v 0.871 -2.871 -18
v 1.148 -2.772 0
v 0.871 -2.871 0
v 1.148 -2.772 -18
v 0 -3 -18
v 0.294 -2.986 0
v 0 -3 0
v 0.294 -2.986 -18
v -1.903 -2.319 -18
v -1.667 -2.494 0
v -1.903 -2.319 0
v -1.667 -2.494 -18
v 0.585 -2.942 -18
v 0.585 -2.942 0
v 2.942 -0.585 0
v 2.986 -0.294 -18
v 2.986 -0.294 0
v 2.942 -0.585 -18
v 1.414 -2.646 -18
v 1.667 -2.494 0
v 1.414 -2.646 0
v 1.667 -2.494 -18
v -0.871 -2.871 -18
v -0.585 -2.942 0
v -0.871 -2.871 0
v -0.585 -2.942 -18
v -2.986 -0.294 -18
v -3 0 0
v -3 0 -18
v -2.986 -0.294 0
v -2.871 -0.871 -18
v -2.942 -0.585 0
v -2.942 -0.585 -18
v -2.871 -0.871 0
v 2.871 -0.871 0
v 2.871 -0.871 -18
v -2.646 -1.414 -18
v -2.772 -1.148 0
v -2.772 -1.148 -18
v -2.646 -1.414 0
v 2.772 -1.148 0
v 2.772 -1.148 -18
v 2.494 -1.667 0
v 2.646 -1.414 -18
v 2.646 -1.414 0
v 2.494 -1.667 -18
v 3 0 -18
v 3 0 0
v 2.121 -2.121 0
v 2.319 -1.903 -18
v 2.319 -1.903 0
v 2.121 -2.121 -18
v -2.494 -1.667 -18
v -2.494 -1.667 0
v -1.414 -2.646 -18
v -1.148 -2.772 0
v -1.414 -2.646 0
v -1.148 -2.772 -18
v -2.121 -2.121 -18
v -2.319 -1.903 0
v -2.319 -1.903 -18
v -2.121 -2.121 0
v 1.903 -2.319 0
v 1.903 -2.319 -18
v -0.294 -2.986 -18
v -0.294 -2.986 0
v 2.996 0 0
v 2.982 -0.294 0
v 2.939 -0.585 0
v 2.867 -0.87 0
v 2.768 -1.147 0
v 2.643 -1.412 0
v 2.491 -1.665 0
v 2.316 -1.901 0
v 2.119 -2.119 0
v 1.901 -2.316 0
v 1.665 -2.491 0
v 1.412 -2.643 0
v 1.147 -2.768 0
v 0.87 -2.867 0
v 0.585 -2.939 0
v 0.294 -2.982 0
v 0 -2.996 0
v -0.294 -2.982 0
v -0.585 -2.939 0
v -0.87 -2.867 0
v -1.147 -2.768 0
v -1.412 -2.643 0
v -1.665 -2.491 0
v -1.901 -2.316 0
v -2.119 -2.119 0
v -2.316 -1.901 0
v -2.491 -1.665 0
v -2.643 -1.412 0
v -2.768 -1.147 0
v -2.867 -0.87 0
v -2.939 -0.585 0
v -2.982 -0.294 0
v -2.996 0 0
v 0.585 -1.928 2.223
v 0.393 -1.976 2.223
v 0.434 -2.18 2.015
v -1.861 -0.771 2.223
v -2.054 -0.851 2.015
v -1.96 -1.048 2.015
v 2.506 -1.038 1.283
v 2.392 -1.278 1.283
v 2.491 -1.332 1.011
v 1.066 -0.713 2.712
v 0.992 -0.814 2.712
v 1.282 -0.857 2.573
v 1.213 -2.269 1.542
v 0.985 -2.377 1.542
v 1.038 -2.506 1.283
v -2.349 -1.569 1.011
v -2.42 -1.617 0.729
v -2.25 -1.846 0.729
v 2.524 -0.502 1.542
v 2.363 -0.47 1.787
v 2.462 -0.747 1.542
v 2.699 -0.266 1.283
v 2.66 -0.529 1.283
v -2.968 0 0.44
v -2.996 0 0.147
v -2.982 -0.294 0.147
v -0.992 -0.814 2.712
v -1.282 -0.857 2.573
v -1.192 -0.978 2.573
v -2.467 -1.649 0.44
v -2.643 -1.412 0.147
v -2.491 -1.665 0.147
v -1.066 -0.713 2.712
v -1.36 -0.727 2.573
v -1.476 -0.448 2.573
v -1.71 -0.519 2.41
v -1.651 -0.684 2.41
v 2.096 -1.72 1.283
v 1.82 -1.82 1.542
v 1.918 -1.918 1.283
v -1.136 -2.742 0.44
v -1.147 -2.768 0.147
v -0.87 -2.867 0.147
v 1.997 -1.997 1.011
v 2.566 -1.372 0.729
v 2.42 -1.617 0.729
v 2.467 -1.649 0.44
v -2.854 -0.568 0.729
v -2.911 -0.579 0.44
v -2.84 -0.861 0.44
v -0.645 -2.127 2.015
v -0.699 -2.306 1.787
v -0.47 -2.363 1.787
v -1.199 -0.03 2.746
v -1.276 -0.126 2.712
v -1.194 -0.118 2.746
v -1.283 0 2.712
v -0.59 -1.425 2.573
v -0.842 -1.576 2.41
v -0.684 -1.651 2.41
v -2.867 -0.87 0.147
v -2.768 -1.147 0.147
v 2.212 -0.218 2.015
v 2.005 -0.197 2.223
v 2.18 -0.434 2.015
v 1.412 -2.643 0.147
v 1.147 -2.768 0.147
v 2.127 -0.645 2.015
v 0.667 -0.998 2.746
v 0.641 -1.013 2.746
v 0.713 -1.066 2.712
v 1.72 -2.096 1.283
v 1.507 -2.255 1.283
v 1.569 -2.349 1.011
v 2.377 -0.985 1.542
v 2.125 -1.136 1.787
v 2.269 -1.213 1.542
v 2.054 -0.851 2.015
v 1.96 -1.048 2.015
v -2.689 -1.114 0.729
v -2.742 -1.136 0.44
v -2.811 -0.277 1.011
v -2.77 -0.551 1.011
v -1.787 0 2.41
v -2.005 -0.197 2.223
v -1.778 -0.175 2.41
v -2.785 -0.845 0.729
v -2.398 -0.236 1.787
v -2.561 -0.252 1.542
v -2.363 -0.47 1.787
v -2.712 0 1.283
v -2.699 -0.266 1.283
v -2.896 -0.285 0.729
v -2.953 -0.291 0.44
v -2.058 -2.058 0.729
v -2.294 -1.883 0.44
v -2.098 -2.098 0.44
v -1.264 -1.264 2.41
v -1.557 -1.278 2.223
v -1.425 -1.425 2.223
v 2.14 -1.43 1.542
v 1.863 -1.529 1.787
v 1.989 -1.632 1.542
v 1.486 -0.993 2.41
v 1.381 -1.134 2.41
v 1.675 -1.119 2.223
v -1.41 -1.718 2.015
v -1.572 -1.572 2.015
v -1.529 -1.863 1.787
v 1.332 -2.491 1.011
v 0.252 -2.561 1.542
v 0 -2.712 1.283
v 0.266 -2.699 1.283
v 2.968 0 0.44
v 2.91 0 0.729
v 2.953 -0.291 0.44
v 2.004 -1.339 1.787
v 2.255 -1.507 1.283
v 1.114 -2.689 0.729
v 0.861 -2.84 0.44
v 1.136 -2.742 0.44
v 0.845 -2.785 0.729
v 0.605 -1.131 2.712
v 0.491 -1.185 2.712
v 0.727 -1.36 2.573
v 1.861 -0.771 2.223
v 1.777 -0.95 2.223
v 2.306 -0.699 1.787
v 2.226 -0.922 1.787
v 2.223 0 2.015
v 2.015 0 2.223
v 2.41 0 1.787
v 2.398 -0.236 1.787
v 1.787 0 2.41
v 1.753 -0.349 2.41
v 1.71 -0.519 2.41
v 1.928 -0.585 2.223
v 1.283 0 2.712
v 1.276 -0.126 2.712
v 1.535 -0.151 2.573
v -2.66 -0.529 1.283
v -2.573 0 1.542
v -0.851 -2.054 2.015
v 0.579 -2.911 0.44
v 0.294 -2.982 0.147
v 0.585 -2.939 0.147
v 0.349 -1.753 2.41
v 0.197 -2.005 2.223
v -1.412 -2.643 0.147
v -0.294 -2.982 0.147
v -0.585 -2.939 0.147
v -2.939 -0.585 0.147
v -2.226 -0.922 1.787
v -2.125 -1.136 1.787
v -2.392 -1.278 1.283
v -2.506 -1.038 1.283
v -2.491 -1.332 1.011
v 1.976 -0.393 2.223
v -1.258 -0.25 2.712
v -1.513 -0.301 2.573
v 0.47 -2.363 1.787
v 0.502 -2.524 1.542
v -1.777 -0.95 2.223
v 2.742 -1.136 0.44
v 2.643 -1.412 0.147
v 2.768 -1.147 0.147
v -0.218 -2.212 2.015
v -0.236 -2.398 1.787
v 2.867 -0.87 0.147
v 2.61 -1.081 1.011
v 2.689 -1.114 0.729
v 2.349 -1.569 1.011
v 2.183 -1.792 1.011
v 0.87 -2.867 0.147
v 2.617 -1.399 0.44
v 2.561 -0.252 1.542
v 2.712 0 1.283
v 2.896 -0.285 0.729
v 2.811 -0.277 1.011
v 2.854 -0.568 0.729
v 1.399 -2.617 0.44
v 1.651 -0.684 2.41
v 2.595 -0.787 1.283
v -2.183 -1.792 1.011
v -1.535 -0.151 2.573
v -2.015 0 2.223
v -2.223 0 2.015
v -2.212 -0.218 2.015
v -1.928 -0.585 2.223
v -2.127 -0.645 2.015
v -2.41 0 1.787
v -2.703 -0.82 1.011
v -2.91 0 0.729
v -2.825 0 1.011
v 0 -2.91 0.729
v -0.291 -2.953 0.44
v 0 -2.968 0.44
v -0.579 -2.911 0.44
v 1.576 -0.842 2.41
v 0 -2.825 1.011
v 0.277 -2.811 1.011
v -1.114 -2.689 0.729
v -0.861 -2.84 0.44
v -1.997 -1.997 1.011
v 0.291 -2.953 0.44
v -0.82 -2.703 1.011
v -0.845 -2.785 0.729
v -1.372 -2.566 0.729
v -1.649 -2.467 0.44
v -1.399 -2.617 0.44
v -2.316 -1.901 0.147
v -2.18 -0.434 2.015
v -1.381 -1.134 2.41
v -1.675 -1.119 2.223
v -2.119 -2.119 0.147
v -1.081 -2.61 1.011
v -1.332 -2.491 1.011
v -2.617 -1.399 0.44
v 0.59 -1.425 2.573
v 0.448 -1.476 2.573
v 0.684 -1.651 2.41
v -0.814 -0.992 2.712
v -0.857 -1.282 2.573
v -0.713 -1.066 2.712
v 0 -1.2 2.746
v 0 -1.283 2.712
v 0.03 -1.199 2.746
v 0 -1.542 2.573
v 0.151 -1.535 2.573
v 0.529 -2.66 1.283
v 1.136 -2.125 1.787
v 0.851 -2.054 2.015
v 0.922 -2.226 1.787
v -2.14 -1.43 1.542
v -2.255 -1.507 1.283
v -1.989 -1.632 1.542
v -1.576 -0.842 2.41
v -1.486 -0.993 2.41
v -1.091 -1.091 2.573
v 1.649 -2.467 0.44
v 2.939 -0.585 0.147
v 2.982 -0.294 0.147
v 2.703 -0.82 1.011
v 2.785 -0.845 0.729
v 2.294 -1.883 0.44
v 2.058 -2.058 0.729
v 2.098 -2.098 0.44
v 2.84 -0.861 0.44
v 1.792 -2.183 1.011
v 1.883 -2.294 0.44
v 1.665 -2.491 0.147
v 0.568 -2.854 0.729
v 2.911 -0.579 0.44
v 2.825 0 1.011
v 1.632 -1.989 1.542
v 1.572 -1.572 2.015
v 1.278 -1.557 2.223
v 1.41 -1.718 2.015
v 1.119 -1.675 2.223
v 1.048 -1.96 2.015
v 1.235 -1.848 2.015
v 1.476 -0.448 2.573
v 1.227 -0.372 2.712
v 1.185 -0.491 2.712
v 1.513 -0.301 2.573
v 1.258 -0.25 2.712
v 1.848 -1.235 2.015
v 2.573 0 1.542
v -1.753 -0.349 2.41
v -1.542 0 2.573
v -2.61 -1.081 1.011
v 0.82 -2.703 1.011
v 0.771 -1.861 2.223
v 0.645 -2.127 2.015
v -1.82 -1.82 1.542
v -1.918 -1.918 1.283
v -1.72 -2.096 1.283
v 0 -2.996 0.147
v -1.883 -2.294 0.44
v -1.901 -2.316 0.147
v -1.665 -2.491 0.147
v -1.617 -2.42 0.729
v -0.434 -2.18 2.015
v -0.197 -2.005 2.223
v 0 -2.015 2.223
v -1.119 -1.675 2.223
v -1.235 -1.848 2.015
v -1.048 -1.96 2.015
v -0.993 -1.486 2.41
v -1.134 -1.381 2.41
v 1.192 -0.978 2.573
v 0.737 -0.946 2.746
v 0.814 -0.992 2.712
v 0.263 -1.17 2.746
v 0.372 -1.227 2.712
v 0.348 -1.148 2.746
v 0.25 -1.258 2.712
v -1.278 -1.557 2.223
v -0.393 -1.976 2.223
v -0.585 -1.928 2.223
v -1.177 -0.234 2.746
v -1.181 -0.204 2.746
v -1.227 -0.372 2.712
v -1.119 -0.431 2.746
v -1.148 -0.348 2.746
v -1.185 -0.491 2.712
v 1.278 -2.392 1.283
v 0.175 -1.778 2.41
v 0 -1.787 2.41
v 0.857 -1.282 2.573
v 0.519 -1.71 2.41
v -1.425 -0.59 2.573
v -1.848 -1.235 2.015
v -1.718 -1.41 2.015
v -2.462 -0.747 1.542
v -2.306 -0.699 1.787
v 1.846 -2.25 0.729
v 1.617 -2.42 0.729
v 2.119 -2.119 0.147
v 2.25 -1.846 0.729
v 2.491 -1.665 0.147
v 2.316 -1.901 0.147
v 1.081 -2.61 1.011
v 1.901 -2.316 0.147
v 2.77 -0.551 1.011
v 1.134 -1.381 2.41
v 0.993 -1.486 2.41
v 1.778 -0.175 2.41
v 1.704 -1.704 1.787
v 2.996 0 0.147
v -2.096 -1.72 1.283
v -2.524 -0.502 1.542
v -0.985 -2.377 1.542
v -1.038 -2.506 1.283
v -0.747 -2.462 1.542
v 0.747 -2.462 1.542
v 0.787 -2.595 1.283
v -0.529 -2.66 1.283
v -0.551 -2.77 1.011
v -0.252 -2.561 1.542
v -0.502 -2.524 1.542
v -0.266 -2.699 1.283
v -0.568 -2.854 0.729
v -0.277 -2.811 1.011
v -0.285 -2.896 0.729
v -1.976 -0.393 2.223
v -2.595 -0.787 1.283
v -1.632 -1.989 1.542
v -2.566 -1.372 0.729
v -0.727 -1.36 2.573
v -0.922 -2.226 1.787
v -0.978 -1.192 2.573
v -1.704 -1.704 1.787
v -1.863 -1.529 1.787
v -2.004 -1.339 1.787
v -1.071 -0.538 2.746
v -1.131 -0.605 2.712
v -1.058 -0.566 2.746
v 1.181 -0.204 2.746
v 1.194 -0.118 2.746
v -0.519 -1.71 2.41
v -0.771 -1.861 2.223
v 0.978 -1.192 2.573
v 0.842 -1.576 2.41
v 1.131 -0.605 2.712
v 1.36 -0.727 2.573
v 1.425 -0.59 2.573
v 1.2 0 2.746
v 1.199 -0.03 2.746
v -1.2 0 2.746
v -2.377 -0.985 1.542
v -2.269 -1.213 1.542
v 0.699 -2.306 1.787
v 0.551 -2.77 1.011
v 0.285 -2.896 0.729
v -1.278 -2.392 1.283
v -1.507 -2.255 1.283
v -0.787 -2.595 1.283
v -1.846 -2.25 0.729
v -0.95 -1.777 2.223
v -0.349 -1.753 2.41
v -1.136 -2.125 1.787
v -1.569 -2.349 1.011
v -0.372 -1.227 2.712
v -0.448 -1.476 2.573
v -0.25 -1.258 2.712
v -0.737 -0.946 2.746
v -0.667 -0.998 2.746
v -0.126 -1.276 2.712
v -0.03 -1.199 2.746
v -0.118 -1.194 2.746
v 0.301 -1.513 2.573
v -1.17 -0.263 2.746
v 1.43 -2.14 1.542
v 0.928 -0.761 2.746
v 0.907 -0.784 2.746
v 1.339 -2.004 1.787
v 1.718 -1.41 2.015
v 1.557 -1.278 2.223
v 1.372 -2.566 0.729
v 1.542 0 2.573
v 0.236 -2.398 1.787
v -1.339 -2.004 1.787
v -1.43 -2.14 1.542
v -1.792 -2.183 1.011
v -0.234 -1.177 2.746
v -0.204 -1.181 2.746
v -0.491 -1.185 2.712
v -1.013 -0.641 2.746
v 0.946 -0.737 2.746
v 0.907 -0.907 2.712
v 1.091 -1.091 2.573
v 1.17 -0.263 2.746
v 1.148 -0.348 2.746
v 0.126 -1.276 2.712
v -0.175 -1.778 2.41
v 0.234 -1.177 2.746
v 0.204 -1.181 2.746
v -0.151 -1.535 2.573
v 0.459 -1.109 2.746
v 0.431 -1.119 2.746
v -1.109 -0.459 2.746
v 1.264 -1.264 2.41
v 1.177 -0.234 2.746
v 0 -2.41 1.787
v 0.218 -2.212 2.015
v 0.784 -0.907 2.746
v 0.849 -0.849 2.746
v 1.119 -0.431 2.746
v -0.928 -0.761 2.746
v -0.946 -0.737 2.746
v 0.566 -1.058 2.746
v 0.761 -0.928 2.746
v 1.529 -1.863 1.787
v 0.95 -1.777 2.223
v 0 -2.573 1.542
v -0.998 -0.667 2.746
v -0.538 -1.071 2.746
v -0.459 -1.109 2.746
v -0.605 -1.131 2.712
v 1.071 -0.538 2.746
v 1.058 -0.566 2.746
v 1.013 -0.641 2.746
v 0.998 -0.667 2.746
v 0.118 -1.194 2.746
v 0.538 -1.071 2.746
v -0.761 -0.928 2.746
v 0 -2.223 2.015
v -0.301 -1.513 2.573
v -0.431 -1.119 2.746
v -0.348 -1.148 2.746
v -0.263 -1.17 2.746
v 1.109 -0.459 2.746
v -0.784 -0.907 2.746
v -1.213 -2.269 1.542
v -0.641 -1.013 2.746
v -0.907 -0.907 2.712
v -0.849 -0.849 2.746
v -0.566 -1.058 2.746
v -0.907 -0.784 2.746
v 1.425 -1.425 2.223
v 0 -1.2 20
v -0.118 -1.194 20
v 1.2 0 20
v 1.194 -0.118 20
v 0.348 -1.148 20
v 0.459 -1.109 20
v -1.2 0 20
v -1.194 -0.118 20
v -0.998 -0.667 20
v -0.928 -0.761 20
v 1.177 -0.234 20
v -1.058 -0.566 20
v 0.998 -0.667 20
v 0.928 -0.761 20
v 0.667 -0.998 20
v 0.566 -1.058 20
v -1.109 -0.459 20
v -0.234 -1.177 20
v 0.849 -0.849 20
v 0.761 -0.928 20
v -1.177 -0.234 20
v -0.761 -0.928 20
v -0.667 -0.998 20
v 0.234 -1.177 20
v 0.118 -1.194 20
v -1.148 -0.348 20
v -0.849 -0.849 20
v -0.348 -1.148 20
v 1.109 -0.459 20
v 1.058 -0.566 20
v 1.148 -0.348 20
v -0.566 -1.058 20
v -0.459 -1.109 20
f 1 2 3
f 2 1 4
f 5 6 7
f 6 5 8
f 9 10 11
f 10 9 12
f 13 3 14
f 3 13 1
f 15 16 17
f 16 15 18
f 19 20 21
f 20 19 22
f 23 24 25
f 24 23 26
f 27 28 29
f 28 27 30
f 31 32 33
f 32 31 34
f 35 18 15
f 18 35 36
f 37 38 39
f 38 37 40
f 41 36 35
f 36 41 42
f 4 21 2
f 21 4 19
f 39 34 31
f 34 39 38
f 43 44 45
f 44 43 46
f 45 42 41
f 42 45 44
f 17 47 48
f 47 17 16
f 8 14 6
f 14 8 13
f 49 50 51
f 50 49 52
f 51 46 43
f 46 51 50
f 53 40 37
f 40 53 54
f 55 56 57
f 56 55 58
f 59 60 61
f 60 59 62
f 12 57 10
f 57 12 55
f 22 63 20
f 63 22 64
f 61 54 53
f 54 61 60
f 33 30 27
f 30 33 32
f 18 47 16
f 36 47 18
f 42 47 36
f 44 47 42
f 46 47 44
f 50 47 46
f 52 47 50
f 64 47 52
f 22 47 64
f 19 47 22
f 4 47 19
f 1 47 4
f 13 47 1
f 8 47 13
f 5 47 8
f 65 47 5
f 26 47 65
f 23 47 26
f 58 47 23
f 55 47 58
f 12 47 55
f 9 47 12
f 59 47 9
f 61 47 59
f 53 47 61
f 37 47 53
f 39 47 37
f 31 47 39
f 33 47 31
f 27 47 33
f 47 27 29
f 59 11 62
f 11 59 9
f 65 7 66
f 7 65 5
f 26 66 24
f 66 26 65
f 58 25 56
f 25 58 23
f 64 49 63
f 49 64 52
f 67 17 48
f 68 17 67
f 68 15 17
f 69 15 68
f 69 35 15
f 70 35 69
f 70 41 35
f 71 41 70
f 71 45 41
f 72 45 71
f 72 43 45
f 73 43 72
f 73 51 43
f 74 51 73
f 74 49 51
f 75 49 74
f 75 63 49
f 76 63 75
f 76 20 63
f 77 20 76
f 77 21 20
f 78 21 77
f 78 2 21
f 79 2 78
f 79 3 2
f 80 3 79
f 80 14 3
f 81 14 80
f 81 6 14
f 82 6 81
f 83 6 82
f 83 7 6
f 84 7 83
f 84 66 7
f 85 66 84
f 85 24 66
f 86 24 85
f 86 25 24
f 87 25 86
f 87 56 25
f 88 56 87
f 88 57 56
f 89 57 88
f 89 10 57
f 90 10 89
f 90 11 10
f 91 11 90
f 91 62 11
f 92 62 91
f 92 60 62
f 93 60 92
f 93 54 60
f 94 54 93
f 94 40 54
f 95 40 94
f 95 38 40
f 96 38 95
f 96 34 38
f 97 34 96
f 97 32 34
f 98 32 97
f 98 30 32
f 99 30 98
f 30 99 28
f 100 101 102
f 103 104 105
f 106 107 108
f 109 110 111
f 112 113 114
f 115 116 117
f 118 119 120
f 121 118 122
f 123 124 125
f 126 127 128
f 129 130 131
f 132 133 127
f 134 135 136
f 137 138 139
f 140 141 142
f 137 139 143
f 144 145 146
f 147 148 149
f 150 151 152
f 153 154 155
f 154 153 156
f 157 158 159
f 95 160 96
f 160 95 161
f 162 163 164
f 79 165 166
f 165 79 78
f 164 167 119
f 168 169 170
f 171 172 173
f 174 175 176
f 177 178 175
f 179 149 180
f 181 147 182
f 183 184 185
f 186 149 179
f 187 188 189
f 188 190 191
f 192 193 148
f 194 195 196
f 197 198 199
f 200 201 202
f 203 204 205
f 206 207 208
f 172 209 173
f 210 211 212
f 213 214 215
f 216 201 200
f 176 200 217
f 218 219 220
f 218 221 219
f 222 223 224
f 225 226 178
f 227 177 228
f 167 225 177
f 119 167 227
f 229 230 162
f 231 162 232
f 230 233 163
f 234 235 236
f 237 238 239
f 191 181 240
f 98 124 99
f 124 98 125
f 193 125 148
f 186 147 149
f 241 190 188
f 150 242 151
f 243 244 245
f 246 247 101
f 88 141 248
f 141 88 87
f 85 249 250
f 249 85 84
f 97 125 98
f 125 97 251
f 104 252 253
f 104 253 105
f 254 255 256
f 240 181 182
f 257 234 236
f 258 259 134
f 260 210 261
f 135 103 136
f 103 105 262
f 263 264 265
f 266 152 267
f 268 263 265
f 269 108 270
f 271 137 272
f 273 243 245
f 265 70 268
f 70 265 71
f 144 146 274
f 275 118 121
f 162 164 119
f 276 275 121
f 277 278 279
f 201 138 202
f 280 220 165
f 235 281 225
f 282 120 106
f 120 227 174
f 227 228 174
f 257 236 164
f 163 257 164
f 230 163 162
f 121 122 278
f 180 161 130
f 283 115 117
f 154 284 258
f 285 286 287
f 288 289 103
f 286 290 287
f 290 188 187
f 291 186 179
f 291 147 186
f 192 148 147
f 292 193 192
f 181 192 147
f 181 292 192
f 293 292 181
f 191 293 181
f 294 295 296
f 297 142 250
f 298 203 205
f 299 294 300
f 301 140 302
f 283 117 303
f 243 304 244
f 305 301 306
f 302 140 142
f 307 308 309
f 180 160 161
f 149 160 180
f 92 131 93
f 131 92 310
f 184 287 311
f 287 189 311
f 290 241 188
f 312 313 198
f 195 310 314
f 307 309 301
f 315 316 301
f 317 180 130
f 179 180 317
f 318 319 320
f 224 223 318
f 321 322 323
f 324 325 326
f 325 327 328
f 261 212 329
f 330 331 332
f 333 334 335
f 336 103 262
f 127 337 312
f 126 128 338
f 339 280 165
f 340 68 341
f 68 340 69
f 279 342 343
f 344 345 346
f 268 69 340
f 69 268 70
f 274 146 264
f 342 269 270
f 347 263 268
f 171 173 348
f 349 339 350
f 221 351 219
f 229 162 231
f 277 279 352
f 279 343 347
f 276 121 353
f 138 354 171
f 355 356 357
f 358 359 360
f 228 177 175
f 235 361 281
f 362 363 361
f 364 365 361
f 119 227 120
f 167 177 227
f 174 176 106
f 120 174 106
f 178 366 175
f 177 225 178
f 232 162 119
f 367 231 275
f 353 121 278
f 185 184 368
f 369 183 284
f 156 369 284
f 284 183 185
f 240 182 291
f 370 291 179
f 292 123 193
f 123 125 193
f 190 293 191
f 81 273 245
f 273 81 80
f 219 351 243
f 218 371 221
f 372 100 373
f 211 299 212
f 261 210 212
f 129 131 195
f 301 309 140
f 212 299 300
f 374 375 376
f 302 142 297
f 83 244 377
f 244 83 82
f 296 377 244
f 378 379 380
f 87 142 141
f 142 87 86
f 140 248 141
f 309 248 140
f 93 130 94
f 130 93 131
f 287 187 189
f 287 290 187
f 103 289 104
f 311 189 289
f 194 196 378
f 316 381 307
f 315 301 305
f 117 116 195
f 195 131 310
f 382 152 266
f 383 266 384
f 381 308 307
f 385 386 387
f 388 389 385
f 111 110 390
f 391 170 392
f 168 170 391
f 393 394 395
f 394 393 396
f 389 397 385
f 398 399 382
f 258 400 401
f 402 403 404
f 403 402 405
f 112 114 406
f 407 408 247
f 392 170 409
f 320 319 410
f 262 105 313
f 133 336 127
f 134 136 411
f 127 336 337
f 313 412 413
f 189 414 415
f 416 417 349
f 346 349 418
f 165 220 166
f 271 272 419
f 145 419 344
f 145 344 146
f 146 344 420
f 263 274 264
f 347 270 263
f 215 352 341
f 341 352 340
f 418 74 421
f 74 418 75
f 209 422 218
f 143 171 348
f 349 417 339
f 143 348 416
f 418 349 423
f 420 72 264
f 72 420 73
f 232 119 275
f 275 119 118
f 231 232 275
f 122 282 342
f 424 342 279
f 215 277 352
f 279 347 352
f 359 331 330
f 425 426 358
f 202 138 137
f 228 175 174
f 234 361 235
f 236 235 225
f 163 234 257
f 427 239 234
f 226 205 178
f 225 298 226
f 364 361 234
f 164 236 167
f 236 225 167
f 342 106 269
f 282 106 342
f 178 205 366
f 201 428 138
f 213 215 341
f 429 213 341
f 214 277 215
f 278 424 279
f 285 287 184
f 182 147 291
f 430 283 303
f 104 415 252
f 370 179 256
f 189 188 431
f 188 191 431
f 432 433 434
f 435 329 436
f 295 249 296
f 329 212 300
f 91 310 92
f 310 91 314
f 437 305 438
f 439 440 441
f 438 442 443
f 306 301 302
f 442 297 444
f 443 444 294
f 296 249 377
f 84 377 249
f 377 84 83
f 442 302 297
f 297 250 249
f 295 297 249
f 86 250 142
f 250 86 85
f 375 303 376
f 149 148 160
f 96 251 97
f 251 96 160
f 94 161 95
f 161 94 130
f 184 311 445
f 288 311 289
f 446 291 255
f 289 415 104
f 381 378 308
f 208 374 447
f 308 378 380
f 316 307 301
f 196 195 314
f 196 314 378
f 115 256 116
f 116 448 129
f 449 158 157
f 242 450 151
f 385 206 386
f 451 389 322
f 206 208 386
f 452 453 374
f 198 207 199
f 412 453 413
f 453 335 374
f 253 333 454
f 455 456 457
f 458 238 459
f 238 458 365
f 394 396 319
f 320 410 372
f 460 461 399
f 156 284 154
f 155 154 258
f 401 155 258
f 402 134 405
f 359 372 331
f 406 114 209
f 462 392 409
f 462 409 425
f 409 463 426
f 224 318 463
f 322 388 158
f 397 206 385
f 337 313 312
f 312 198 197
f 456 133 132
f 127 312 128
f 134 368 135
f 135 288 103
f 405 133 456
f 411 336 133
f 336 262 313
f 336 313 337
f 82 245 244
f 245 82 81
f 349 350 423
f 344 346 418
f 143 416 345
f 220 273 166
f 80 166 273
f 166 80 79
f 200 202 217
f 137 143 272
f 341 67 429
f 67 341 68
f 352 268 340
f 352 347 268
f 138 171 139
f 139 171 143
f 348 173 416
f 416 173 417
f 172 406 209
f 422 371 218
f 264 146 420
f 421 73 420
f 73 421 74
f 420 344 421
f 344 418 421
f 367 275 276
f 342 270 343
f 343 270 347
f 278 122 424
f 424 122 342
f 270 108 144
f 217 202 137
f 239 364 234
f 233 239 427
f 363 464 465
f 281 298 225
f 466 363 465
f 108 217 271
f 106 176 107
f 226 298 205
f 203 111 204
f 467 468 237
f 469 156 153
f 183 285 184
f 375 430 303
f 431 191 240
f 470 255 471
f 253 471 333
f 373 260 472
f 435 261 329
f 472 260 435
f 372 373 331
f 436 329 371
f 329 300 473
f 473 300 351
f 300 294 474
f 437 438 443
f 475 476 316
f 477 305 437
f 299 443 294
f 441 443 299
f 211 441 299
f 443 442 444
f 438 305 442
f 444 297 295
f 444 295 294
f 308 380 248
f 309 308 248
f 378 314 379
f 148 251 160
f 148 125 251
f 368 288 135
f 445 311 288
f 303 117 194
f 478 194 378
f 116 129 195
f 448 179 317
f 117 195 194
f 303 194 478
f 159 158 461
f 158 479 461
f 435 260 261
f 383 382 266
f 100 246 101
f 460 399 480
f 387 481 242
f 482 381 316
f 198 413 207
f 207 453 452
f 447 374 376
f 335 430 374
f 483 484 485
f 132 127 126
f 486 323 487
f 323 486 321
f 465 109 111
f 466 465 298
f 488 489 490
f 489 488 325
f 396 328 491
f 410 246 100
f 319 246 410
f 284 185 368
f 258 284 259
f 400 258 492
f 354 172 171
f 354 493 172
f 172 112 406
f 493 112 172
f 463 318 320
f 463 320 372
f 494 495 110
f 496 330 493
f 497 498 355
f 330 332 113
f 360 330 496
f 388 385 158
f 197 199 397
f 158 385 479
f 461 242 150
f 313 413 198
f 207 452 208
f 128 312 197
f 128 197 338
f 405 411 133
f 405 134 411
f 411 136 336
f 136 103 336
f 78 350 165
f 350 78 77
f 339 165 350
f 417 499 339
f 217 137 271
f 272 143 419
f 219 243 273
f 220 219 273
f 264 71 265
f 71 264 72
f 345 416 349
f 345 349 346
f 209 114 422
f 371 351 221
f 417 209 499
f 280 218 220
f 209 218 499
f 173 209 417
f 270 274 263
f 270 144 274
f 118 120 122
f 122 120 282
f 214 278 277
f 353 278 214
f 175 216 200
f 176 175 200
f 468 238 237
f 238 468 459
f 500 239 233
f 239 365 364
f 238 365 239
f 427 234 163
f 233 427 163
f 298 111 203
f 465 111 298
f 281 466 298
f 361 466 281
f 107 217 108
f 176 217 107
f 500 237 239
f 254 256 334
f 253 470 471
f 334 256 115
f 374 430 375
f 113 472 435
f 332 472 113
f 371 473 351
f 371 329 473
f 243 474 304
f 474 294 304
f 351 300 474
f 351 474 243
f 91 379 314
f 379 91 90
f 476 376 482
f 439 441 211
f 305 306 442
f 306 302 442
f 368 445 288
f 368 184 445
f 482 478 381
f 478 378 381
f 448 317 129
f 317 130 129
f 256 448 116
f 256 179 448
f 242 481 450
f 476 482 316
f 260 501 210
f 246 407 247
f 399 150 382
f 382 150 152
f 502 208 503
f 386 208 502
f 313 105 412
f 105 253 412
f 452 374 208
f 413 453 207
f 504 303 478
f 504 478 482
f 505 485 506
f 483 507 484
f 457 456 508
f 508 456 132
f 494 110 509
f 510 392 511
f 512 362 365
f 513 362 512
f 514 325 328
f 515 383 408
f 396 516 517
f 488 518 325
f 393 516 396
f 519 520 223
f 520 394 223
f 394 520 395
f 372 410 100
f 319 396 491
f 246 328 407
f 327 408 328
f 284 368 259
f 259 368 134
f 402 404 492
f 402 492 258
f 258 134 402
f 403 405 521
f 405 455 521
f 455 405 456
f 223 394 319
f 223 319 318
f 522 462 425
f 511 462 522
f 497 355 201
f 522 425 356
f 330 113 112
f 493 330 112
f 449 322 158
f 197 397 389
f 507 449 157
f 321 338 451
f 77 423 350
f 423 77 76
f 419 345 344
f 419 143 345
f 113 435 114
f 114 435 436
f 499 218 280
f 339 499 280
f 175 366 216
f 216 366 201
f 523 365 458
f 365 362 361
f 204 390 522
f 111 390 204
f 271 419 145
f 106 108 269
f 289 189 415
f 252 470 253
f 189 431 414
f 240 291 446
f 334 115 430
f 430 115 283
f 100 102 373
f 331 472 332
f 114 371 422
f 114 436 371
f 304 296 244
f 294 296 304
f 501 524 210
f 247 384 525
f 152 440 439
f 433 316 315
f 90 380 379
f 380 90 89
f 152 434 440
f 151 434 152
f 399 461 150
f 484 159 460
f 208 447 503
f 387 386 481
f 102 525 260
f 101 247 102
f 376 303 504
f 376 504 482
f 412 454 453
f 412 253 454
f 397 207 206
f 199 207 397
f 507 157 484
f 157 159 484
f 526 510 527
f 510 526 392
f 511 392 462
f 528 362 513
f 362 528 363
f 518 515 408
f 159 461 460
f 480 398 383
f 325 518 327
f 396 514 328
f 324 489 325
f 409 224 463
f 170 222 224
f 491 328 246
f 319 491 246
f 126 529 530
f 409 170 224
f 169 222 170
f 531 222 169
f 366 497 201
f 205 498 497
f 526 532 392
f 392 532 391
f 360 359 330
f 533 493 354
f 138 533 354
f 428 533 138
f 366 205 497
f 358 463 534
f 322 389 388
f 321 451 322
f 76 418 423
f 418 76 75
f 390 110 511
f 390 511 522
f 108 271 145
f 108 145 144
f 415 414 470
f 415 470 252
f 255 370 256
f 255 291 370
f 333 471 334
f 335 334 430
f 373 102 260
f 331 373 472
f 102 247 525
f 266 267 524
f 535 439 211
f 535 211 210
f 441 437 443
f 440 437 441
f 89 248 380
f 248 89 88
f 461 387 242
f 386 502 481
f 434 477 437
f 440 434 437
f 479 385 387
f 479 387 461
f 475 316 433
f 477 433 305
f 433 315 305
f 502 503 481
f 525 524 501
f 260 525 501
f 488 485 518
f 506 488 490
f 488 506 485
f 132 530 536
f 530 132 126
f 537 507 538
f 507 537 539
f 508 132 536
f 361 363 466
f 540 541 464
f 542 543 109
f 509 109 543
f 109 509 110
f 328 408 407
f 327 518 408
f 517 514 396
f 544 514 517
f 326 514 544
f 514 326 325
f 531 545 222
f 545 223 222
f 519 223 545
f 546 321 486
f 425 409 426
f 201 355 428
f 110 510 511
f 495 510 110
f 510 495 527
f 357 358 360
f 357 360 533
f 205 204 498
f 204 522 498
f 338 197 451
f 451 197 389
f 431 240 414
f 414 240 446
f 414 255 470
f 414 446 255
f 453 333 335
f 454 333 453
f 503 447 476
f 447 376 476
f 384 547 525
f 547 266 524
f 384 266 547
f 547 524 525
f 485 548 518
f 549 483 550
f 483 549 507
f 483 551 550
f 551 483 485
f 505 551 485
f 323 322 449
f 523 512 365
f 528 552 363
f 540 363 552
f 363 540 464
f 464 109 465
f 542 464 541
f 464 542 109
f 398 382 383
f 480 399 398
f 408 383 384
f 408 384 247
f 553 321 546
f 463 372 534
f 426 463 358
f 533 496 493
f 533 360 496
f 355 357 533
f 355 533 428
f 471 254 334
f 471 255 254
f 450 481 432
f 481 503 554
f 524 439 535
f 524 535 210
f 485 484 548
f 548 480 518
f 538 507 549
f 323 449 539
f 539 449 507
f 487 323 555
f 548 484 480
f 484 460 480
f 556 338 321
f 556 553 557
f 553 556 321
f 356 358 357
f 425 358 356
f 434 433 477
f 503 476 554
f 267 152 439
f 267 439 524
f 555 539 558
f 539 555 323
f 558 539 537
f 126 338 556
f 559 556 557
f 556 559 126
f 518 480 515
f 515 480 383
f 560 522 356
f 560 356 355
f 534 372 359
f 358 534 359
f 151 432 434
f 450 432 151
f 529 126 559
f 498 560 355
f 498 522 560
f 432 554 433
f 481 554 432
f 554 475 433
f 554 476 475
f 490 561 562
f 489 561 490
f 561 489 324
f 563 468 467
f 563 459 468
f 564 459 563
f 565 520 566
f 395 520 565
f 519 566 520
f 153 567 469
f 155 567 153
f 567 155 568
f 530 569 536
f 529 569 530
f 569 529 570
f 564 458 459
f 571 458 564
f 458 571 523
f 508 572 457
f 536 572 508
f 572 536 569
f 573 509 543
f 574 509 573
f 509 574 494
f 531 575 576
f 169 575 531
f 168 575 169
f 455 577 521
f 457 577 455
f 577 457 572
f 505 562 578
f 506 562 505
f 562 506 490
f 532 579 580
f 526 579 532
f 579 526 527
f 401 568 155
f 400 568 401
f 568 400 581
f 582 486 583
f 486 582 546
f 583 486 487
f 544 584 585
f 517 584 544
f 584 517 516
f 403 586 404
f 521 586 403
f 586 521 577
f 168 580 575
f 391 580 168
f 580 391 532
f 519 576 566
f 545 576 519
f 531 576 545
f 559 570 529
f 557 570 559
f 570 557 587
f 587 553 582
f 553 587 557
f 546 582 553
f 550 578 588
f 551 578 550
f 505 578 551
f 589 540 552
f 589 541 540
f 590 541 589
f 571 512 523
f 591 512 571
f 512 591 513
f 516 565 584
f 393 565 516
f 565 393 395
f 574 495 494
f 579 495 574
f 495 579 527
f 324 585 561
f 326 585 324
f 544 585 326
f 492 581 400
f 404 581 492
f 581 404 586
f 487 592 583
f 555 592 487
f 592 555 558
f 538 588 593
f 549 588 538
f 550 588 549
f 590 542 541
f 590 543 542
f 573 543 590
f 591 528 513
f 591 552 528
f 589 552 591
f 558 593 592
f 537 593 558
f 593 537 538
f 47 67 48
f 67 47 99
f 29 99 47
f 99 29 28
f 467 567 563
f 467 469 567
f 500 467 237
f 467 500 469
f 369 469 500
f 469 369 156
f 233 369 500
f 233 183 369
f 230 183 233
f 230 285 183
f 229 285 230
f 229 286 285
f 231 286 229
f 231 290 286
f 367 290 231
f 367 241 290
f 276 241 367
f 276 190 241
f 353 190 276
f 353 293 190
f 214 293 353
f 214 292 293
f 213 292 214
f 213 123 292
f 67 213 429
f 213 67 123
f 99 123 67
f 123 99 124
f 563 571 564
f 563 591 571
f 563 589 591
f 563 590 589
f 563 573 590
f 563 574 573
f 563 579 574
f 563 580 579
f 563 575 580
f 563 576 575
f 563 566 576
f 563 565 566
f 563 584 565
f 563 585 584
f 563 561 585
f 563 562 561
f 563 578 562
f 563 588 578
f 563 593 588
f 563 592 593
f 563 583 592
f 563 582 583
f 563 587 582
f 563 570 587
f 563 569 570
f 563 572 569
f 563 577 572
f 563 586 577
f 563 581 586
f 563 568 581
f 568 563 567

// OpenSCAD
// file: E_tpu_rebar.scad
// =============================================================================
// Design E — TPU "rebar" (barbed) embedded several mm into the PETG strut tip
// =============================================================================
// TPU cable extends several mm into the PETG strut tip; PETG is printed on
// top of and around the embedded TPU, mechanical pullout limited by barbs
// (rebar in concrete). Per Edison ANALYSIS c38a2046 §4 geometry:
//   - Embed length:        10–12 mm along the strut axis (here: 11 mm)
//   - Anchor stem Ø:       2.4 mm (matches cable_d)
//   - Barbs:               2–3 at 2.0 mm pitch
//   - Barb major Ø:        3.0–3.2 mm (here: 3.1 mm)
//   - Barb step height:    ≥ 0.4 mm
//   - Flank angles:        30–45° on pull-out face; 45–60° on insertion face
//   - PETG ligament:       ≥ 1.0–1.2 mm from barb crest to outer surface
// =============================================================================
include <_common.scad>

embed_l       = 11.0;     // axial embed depth along strut axis (-Z direction from tip)
n_barbs       = 3;
barb_pitch    = 2.0;
barb_major_d  = 3.1;
barb_step     = (barb_major_d - cable_d) / 2;     // 0.35 mm radial step (close to spec)
flank_pull    = 35;       // pull-out face flank from radial (deg). Smaller = sharper barb.
flank_push    = 55;       // insertion face flank (deg). Larger = easier to insert.

// One barb as a triangular cross-section ring around the stem, centered
// on axial position z_center. Sharp pull-out face on the +Z side (toward
// the strut tip — bears load when the cable is pulled), shallow insertion
// face on the -Z side.
module one_barb(z_center) {
    pull_run = barb_step / tan(flank_pull);   // axial run of the sharp face
    push_run = barb_step / tan(flank_push);   // axial run of the shallow face
    translate([0, 0, z_center])
        rotate_extrude($fn=64)
            polygon(points = [
                [cable_d/2,        pull_run],   // stem just above crest (sharp side)
                [barb_major_d/2,   0],          // crest at radius barb_major_d/2
                [cable_d/2,       -push_run],   // stem well below crest (shallow side)
            ]);
}

module rebar_anchor() {
    // The embedded TPU rebar lives in the strut tip below z = 0.
    union() {
        // Stem
        translate([0, 0, -embed_l]) cylinder(h=embed_l, d=cable_d);
        // Barbs at evenly-spaced axial positions (deepest first)
        for (i = [0:n_barbs-1])
            one_barb(z_center = -embed_l + barb_pitch + i*barb_pitch);
    }
}

module designE_petg() {
    difference() {
        union() {
            translate([0, 0, -strut_l]) cylinder(h=strut_l, d=strut_d);
            sphere(d=strut_d);
        }
        rebar_anchor();
    }
}

module designE_tpu() {
    rebar_anchor();
    // Cable continues out the strut tip toward +Z (the natural strut axis)
    cylinder(h=cable_l, d=cable_d);
}

module designE() {
    petg() designE_petg();
    tpu()  designE_tpu();
}

designE();
// file: _common.scad
// Shared parameters for the five candidate PETG-strut + TPU-cable joint
// designs explored in `edison-trajectories/joint-design/`.
//
// Coordinate convention (per design): the PETG strut runs along +Z and the
// TPU cable runs along the global +X direction (so the joint plane is the
// X-Z plane). All units in mm. PETG is rendered orange, TPU dark cyan.
strut_d = 6.0;     // PETG strut diameter (matches t3-prism.scad)
cable_d = 2.4;     // TPU cable diameter (matches t3-prism.scad)
strut_l = 18.0;    // visible strut length to render
cable_l = 30.0;    // visible cable length on each side
$fn = 64;

PETG_RGB = [0.95, 0.55, 0.20];
TPU_RGB  = [0.10, 0.55, 0.55];

module petg() { color(PETG_RGB) children(); }
module tpu()  { color(TPU_RGB)  children(); }

// Strut as a vertical capsule along +Z, tip at z = 0, body extending to -strut_l.
module strut_body(length = strut_l, d = strut_d) {
    translate([0, 0, -length]) cylinder(h=length, d=d);
    sphere(d=d);
}

// Straight TPU cable along +X.
module cable_segment(length = cable_l, d = cable_d, x0 = 0) {
    translate([x0, 0, 0])
        rotate([0, 90, 0])
            cylinder(h=length, d=d);
}
// main file
// Section view of Design E — TPU rebar embedded in PETG strut tip, cut at
// Y=0 (keep -Y half), color preserved by per-part intersection.
include <_common.scad>
use <E_tpu_rebar.scad>

module half_cube_negY() { translate([-30, -30, -40]) cube([60, 30, 60]); }

petg() intersection() { designE_petg(); half_cube_negY(); }
tpu()  intersection() { designE_tpu();  half_cube_negY(); }
